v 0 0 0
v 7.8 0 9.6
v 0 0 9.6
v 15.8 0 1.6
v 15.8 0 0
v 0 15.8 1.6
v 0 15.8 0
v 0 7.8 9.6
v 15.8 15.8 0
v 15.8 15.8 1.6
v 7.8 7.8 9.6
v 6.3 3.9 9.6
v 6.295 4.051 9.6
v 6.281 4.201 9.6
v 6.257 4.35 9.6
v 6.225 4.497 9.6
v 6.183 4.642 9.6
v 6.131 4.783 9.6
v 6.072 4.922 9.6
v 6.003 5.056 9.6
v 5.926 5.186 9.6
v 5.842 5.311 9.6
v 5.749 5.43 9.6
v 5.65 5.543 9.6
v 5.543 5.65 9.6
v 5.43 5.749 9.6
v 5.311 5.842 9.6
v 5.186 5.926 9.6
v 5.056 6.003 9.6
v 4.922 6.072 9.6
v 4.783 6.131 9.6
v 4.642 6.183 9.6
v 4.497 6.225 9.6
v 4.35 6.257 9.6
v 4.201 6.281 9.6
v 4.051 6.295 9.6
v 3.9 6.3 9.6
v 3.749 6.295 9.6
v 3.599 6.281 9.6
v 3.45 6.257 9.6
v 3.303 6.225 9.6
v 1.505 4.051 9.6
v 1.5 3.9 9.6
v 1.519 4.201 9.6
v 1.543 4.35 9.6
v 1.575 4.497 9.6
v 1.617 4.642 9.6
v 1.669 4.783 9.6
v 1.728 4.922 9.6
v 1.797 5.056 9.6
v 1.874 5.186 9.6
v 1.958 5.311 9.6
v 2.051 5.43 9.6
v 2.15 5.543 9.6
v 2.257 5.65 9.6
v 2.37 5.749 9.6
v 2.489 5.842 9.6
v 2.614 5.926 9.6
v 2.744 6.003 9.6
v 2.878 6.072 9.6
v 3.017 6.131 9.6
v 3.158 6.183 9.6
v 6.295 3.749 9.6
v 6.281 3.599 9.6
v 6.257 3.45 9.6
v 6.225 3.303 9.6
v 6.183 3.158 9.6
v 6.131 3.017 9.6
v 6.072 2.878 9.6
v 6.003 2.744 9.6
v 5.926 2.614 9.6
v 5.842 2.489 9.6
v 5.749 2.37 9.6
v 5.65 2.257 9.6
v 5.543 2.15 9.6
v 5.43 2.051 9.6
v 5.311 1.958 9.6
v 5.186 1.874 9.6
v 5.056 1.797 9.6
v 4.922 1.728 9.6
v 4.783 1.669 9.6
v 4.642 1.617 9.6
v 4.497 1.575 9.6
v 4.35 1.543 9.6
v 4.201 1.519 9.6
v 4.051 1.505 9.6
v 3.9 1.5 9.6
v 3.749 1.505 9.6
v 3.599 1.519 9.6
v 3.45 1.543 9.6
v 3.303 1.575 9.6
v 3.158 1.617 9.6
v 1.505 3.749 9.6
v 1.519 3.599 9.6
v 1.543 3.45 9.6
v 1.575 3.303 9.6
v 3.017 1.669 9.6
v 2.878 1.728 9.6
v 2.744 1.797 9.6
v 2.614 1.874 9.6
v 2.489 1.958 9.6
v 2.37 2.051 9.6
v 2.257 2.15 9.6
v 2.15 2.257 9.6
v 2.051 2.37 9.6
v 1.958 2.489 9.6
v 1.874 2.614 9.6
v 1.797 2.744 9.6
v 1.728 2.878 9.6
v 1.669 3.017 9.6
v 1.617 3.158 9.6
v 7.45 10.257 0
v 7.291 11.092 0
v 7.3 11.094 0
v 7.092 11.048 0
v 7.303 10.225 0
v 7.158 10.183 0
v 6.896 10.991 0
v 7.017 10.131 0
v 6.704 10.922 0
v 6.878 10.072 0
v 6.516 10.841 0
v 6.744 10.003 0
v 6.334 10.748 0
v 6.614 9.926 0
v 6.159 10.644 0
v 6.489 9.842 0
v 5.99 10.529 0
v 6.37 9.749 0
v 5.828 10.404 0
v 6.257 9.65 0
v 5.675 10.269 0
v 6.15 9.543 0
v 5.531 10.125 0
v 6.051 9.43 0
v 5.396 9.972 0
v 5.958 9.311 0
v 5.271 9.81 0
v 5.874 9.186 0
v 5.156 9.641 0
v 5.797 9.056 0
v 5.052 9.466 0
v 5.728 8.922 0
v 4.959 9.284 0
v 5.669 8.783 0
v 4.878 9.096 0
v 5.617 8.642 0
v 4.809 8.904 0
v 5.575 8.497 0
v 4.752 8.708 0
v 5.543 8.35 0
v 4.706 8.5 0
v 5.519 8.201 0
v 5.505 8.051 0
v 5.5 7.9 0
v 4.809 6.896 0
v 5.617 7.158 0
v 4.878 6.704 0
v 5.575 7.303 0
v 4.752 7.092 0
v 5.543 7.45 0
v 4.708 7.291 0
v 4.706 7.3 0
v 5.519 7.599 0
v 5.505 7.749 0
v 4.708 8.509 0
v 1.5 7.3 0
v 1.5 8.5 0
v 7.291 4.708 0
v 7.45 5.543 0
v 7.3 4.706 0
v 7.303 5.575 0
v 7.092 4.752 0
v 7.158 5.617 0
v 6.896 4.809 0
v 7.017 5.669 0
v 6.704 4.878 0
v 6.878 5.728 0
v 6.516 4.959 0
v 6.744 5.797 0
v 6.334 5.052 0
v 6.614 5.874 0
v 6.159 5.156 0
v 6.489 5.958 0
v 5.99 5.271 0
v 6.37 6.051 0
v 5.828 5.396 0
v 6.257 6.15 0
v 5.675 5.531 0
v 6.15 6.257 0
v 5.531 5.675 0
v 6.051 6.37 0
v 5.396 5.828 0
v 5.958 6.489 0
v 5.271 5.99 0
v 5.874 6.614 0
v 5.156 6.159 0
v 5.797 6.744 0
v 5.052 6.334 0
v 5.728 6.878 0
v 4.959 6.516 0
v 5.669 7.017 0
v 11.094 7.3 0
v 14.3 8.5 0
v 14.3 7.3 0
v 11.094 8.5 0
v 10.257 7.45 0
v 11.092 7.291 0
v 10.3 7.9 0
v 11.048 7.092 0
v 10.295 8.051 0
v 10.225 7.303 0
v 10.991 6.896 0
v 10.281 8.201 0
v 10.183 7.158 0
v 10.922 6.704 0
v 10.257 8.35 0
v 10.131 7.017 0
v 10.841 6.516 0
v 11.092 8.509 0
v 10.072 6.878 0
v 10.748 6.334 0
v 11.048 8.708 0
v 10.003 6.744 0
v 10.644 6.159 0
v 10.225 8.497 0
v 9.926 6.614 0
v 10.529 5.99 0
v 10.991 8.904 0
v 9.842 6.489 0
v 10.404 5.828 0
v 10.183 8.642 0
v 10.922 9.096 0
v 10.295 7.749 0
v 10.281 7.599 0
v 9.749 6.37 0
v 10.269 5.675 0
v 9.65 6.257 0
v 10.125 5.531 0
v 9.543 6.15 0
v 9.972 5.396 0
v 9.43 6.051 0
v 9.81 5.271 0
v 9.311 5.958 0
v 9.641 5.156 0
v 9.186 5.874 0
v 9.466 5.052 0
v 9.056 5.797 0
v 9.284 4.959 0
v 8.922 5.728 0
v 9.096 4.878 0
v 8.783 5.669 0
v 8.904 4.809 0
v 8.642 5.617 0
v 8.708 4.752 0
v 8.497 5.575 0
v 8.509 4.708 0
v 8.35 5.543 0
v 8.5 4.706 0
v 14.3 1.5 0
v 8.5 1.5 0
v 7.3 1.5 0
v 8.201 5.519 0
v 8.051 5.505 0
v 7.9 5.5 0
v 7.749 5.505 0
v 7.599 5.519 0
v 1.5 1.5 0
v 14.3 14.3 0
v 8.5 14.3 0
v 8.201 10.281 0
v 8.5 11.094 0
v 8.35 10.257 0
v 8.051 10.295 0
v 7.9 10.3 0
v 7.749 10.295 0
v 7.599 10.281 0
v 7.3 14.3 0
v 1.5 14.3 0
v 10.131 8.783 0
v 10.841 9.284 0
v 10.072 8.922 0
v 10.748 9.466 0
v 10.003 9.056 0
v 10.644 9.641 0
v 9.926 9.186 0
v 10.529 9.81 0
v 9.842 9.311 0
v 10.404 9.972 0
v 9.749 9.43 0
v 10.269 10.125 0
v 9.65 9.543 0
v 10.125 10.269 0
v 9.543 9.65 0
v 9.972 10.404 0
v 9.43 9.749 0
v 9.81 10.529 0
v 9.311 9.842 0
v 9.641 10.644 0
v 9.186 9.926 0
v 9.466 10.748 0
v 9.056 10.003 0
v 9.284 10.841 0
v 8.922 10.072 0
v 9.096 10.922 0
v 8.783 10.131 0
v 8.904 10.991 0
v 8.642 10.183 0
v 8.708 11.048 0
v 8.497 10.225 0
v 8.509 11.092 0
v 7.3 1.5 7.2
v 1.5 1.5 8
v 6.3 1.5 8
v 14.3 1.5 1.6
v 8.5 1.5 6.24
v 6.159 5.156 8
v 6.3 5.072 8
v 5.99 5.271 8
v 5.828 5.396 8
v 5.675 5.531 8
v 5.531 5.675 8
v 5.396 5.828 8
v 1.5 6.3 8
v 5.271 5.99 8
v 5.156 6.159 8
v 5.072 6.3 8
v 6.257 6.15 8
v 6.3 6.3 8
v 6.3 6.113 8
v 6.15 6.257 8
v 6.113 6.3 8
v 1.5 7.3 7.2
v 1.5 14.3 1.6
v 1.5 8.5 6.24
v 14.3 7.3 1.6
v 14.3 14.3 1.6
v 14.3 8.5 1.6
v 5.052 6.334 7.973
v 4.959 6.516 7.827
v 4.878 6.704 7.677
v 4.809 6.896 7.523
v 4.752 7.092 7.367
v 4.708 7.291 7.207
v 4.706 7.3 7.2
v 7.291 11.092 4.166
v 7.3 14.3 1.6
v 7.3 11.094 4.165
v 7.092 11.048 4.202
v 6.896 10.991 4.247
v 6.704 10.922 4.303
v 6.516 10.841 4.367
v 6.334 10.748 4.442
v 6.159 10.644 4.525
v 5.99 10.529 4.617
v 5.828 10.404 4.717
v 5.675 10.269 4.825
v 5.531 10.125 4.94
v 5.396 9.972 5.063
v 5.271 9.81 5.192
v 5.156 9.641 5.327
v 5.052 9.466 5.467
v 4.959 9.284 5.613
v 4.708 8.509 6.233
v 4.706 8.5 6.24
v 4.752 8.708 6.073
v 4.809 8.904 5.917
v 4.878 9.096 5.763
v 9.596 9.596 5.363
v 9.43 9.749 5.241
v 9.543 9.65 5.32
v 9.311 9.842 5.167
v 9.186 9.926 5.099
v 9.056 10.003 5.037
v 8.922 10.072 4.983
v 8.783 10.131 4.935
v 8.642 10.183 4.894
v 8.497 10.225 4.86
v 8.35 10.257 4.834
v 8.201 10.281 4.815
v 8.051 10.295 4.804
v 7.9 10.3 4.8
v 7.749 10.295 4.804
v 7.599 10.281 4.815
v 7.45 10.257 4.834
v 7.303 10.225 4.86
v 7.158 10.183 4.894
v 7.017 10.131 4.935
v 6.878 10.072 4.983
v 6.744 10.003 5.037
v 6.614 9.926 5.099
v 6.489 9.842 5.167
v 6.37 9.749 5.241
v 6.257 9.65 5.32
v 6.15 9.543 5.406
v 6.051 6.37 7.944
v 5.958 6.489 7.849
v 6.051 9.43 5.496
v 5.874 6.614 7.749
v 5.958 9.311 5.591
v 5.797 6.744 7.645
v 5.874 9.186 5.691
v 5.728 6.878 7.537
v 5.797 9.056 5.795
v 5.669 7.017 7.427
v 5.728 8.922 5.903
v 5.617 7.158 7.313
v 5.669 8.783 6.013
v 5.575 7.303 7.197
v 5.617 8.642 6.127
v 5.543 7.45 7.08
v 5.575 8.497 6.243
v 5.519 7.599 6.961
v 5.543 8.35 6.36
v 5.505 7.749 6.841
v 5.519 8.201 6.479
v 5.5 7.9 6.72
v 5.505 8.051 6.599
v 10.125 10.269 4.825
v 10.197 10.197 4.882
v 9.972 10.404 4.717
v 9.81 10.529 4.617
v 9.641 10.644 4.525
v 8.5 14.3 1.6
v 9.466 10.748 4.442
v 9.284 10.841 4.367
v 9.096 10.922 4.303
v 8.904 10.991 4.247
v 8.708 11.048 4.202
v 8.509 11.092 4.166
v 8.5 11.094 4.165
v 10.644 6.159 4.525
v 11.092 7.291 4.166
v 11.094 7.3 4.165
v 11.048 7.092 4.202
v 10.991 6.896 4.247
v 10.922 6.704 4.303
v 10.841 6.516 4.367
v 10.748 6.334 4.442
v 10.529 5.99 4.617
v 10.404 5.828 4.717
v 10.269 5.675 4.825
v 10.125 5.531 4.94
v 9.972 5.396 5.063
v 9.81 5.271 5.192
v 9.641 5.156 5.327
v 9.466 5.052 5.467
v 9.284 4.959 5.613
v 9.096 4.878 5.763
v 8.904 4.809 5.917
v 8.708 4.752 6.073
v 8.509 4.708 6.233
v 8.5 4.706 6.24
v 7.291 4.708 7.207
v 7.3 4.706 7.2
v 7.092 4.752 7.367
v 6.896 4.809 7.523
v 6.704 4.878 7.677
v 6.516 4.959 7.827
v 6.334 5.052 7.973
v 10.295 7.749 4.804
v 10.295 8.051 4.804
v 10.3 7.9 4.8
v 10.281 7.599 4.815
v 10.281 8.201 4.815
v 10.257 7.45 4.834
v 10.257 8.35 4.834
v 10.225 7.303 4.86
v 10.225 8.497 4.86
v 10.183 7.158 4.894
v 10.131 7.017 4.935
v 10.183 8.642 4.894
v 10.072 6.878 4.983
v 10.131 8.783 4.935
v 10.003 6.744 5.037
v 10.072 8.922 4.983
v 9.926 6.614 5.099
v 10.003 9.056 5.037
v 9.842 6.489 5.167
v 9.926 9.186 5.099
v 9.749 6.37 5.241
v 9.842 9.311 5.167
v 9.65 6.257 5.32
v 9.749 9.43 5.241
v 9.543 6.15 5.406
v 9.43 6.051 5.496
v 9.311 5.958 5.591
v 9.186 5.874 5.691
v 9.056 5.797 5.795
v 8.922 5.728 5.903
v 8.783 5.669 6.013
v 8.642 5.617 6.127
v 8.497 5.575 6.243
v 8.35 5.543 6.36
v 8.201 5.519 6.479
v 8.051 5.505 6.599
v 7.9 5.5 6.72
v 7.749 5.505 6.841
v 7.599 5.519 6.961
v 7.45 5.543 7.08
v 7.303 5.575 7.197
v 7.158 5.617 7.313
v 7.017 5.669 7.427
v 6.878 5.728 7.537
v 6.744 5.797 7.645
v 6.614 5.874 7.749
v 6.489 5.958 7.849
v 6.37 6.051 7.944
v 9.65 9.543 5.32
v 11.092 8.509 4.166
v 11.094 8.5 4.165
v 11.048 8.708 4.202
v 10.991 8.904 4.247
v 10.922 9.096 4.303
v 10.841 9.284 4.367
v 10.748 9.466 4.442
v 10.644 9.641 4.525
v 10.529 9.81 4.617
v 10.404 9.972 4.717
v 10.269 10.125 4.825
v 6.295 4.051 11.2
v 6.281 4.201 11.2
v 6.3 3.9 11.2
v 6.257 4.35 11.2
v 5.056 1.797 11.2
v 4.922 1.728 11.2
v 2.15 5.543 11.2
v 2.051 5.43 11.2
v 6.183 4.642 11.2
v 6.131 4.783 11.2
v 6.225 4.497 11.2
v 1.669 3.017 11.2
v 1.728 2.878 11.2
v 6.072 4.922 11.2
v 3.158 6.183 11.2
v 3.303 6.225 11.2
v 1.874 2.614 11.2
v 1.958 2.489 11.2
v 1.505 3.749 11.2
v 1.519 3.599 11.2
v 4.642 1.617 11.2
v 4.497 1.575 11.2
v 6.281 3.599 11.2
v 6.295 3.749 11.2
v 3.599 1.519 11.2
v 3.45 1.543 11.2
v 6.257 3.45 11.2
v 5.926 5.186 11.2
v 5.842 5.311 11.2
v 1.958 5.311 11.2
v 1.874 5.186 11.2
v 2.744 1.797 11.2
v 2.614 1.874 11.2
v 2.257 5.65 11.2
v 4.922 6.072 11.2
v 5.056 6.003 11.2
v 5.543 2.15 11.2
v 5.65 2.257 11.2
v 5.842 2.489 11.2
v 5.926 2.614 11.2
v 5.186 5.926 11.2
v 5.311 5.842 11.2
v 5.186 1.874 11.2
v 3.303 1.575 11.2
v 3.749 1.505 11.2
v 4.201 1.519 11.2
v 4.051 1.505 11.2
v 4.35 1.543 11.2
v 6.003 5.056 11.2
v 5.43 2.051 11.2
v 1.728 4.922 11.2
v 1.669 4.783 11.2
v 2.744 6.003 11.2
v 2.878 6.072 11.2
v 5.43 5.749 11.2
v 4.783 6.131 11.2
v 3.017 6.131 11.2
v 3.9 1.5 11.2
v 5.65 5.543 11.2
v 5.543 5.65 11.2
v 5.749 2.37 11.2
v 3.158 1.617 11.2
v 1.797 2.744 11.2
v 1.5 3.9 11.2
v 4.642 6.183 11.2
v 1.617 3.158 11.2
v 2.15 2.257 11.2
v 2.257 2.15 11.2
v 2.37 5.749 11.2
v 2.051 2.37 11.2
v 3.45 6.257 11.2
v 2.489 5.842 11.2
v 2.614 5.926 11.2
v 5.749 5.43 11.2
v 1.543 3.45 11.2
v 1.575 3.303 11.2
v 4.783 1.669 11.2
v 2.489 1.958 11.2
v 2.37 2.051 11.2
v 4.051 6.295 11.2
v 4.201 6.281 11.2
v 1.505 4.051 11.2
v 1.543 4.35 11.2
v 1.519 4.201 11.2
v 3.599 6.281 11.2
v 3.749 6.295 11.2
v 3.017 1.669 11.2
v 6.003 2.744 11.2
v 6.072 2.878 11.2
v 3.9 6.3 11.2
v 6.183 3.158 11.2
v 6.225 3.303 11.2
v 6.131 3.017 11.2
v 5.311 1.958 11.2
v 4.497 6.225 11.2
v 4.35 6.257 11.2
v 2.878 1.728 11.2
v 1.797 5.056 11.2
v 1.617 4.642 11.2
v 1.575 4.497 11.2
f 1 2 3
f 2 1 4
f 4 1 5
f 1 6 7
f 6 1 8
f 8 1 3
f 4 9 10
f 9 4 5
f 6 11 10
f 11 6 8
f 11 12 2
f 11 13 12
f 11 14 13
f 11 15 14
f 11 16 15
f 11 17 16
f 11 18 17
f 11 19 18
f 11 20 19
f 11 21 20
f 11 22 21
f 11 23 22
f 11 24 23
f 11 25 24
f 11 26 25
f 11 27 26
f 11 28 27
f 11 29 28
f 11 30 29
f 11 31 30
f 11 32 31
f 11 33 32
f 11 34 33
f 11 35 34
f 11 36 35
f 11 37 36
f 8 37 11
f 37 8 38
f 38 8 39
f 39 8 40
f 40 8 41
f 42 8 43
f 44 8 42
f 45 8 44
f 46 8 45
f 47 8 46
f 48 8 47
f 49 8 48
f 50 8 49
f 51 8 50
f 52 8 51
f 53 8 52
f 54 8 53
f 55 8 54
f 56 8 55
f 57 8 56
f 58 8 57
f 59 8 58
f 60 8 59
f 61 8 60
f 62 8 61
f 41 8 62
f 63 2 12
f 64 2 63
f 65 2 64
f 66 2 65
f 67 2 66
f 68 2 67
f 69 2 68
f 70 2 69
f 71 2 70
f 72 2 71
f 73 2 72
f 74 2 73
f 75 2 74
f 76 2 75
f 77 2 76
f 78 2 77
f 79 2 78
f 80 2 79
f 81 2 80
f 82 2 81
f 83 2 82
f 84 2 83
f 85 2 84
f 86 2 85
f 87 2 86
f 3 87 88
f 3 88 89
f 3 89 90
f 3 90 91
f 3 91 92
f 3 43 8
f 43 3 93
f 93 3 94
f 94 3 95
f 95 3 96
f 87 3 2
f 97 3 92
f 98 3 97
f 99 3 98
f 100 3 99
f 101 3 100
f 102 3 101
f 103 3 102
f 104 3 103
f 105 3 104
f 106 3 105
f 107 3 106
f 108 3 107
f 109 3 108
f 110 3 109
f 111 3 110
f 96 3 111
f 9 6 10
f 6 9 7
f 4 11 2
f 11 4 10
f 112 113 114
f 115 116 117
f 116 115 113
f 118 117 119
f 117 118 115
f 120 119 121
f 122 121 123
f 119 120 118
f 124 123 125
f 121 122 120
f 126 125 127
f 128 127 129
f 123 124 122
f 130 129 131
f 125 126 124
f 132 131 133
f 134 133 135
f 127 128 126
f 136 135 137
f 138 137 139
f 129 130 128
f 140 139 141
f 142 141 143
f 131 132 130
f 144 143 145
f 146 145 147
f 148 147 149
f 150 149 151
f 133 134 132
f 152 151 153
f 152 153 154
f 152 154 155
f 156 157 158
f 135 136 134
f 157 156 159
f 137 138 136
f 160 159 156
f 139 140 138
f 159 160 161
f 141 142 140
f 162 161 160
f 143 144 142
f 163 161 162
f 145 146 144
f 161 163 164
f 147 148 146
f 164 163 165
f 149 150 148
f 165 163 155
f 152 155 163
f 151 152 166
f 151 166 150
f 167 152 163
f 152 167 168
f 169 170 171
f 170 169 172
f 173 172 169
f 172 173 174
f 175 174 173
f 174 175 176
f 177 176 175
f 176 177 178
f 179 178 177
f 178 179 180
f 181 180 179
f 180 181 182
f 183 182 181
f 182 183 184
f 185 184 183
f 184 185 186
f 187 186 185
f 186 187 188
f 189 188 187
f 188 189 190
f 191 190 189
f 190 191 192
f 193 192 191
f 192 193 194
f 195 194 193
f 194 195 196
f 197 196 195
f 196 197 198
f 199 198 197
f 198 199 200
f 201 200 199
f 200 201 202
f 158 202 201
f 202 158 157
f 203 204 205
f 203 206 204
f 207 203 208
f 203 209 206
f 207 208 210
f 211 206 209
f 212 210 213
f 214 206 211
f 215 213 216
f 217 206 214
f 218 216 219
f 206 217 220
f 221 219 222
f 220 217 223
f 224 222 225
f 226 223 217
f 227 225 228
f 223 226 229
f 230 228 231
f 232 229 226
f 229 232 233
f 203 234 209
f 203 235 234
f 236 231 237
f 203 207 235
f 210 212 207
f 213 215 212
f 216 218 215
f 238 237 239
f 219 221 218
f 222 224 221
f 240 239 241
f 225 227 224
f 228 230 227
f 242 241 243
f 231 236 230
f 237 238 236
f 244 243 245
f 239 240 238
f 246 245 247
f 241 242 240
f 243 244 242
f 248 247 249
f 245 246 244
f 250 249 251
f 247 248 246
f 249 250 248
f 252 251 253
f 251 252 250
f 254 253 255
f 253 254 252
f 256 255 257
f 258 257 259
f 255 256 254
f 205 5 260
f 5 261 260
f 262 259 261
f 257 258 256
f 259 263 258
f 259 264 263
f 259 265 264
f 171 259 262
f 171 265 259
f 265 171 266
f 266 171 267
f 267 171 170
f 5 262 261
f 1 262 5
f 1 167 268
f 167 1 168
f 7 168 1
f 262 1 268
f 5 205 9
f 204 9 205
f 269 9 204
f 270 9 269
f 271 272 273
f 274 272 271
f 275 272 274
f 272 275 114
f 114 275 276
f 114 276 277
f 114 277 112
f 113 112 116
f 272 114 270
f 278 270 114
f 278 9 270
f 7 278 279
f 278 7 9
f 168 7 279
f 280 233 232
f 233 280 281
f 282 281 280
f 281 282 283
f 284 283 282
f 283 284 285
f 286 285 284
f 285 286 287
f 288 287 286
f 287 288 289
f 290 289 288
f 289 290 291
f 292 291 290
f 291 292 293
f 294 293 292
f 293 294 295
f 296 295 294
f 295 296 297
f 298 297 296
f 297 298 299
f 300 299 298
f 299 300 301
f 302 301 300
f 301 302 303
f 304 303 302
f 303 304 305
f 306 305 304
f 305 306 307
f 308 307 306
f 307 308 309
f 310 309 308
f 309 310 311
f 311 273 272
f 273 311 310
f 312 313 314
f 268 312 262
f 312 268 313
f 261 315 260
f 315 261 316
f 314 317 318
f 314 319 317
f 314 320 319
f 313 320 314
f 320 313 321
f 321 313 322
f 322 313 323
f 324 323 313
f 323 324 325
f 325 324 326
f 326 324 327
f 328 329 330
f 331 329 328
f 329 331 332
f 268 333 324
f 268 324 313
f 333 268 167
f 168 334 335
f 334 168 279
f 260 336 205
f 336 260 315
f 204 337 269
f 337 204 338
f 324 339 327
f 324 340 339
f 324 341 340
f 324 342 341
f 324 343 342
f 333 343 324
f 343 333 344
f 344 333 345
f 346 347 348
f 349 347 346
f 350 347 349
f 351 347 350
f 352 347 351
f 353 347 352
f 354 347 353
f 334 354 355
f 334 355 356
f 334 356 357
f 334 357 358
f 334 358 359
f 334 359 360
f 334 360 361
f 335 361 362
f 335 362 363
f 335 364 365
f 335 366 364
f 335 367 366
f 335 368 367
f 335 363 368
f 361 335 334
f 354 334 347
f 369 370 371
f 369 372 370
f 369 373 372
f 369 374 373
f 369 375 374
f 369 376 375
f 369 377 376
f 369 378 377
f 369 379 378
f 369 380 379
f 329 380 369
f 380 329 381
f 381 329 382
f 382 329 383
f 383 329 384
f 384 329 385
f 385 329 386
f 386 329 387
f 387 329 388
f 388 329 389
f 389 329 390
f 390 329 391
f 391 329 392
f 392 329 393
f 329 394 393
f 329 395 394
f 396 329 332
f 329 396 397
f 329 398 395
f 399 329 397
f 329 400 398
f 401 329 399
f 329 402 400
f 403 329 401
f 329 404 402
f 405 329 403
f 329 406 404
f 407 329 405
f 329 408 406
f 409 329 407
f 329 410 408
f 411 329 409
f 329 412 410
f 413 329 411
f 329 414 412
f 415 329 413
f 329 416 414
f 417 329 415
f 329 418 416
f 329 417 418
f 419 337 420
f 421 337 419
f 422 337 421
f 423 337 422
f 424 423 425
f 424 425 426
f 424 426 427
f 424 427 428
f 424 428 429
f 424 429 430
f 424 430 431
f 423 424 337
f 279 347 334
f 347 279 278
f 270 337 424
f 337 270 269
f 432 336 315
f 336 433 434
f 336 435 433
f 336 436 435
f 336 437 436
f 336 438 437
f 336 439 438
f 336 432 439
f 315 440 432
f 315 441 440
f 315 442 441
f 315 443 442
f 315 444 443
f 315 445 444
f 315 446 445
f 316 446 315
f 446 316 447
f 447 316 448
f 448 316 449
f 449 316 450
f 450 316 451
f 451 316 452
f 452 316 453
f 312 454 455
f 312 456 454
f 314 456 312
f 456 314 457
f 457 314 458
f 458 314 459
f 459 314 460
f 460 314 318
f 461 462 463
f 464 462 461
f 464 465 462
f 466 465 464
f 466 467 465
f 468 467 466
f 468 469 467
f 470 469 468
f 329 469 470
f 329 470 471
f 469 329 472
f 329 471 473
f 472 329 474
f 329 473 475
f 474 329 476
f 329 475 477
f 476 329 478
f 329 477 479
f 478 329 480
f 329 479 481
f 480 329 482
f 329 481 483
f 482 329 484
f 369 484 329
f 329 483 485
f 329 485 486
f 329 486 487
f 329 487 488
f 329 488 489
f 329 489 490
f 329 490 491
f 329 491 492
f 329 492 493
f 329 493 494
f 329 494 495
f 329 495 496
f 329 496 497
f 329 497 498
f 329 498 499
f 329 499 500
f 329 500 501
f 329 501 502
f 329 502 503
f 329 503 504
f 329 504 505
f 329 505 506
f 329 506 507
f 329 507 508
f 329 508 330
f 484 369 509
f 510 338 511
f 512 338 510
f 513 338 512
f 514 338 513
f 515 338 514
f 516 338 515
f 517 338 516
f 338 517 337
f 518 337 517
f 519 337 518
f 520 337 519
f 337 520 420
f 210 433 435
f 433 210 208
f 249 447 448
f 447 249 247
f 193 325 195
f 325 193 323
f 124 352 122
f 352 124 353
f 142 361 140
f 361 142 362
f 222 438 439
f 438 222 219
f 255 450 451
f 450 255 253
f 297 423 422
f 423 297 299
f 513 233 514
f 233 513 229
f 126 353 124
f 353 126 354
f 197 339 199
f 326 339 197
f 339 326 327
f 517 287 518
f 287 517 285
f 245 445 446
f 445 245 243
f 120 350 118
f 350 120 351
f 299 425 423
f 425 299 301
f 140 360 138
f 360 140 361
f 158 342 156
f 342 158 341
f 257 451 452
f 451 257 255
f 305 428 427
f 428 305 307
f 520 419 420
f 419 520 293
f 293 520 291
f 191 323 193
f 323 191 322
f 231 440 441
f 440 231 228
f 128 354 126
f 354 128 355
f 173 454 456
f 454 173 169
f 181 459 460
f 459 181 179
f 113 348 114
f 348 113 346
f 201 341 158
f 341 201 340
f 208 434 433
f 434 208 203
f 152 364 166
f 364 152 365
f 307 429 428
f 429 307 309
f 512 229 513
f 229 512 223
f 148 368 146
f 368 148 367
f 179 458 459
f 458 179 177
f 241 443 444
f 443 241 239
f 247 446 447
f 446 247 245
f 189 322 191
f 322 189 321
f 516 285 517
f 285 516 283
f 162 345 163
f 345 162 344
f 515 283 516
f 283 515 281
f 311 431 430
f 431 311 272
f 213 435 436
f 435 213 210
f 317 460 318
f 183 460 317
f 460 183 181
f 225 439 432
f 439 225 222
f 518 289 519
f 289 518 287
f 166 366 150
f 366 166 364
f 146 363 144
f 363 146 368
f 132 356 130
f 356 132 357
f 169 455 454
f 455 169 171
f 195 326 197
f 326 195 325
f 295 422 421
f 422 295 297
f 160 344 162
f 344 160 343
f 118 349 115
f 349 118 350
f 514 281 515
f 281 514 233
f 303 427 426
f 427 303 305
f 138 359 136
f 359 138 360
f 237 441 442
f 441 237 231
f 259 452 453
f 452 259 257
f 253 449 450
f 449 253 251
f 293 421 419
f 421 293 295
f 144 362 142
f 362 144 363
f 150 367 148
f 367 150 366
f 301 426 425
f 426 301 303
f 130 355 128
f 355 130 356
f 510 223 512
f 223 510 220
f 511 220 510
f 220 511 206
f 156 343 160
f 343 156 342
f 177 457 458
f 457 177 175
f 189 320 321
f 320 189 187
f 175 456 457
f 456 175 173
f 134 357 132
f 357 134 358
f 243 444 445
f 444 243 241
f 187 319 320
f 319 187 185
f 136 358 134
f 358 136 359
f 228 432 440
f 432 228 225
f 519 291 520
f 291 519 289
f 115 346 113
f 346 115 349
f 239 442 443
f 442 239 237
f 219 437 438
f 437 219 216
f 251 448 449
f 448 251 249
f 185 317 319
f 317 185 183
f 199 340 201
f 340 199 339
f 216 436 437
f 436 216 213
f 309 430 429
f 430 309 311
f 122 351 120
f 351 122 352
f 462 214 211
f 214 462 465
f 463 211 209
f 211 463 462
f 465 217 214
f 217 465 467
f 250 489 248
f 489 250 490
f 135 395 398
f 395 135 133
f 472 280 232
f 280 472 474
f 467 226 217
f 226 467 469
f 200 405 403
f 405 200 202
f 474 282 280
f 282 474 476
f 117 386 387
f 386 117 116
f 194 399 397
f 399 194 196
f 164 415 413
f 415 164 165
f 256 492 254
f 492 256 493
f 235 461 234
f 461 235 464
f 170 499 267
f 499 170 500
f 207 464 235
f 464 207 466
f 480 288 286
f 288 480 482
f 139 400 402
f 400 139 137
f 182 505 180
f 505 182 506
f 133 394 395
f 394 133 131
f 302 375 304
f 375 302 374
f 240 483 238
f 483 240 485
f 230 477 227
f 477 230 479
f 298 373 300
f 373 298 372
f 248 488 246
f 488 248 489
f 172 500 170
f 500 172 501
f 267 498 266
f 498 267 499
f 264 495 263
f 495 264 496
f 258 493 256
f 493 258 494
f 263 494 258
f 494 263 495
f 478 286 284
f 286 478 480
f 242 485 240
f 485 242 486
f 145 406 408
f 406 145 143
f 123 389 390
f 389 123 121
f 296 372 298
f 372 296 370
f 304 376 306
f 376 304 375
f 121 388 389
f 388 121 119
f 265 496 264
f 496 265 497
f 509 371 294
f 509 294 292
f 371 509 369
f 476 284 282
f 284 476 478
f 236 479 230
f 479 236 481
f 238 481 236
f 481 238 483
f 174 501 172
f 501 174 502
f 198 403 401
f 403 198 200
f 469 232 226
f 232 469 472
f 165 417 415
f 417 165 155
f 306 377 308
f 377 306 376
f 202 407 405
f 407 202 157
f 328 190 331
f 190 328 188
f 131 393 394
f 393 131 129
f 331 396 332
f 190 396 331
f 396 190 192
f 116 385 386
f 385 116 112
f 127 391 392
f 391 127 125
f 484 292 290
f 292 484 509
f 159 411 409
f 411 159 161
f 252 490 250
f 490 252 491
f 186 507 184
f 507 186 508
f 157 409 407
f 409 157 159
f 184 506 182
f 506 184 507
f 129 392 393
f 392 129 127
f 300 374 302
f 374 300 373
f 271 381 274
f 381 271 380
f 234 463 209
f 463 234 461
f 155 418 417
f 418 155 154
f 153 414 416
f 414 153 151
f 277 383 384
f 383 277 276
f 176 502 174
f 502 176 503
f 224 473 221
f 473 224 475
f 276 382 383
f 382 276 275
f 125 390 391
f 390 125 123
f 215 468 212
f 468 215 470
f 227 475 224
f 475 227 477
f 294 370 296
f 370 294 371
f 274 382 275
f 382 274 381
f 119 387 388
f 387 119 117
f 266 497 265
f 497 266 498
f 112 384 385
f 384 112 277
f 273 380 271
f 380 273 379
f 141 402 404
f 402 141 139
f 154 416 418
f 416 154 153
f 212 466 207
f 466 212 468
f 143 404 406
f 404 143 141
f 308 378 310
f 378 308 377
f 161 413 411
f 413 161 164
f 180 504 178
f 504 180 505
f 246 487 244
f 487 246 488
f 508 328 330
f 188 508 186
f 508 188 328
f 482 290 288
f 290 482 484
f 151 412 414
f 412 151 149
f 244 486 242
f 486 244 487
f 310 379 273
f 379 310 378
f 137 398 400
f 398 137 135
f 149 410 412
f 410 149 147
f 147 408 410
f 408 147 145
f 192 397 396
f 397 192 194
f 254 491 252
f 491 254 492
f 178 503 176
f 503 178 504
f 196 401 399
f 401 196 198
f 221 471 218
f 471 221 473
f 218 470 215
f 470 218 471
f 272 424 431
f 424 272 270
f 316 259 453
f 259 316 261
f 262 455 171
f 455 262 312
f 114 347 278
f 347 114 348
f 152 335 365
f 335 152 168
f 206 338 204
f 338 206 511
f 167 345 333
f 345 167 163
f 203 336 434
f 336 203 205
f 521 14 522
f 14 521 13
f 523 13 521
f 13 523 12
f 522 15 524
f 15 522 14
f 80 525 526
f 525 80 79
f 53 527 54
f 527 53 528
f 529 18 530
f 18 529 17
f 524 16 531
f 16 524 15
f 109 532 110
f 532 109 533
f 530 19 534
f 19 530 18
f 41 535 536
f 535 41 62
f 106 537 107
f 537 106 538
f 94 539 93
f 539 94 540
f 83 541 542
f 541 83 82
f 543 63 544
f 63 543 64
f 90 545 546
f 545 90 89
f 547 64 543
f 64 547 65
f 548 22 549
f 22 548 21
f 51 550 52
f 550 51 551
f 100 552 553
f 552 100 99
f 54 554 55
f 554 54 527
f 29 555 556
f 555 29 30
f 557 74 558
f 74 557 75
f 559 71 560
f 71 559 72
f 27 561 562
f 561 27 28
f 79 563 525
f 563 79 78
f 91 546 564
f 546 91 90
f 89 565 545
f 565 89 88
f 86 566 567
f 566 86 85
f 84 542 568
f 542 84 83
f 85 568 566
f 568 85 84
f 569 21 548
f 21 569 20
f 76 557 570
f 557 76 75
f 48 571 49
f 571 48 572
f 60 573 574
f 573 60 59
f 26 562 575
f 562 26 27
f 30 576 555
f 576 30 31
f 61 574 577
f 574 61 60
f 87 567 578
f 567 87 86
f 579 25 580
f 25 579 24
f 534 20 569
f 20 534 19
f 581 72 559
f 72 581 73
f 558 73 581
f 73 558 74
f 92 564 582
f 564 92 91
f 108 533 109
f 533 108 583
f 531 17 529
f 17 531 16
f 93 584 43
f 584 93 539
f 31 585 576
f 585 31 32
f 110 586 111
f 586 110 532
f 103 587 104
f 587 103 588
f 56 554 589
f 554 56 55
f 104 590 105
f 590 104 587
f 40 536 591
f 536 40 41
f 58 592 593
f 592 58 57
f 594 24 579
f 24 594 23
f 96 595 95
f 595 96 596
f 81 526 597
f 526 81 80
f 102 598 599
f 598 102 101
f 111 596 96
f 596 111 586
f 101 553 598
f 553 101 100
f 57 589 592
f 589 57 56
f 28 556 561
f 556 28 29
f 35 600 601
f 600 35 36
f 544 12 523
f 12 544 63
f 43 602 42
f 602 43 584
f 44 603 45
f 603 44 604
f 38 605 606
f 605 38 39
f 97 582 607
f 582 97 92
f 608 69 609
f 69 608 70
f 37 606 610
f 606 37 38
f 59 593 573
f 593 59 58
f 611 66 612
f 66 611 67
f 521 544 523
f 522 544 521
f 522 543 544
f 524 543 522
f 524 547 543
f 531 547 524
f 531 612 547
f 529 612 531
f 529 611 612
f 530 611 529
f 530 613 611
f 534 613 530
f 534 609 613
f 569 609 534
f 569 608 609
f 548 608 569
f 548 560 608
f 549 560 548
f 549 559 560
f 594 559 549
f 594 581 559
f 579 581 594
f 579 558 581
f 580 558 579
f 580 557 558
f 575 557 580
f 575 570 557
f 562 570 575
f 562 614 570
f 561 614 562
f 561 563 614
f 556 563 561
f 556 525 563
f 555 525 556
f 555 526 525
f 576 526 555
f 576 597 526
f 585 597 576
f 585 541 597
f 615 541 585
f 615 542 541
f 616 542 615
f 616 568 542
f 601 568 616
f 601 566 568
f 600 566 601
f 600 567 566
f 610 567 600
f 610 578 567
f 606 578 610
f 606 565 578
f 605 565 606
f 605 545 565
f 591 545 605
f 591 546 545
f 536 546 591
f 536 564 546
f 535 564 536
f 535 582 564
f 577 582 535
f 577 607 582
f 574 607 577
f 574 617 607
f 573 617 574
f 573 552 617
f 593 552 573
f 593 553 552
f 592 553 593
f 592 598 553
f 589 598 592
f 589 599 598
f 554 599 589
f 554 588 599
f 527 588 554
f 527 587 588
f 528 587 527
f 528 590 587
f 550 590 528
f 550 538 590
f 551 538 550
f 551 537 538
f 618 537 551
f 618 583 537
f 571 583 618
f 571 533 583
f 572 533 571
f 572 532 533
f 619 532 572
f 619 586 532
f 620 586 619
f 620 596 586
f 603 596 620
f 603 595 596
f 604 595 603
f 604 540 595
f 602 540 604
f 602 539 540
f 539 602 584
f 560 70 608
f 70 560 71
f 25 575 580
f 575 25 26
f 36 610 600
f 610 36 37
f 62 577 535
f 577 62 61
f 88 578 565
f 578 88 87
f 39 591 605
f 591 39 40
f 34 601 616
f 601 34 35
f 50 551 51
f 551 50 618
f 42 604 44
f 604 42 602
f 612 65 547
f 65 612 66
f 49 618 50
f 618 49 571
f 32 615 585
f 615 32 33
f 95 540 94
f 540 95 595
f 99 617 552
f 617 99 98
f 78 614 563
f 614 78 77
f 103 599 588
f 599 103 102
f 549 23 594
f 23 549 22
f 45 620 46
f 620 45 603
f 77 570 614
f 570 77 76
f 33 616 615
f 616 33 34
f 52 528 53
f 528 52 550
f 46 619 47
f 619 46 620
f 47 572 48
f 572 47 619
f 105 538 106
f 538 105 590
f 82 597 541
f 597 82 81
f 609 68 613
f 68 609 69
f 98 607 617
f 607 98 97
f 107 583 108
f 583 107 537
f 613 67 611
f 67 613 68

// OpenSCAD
eps = 0.001;

modelScale = 1.0;


nr_length_units_bottom = 2;
nr_length_units_top = 1;
nr_width_units_bottom = 2;
nr_width_units_top = 1;
isSolidExternalPin = true;
addInnerWalls = true;


// printability corrections; values should be zero for real object dimensions 
PRINTABLE = 0;
correction_t1 = PRINTABLE ? 0.05 : 0.0;



unit_size = 7.8*modelScale;
pitch = 8.0*modelScale;

ho1 = 1.6*modelScale;
ho2 = 8.0*modelScale;
hi1 = 1.6*modelScale;
hi2 = 6.4*modelScale;


t1 = (1.5-correction_t1)*modelScale; // wall thickness
t2 = 1.2*modelScale; // inner wall thickness


// internal pin
r1 = 6.5/2*modelScale;
r2 = 4.8/2*modelScale;


// external pin
h_pin = 1.6*modelScale;
r_pin1 = 4.8/2*modelScale;
r_pin2 = 3.2/2*modelScale;



function getSize(prmNrOfUnits) = prmNrOfUnits*unit_size + (prmNrOfUnits - 1) * (pitch - unit_size);

length_bottom = getSize(nr_length_units_bottom);
length_top = getSize(nr_length_units_top);
width_bottom = getSize(nr_width_units_bottom);
width_top = getSize(nr_width_units_top);
echo("length_bottom", length_bottom);
echo("length_top", length_top);
echo("width_bottom", width_bottom);
echo("width_top", width_top);


function getExternalPinPos(prmPinNr) = prmPinNr*pitch-pitch+unit_size/2;

function getInternalPinPos(prmPinNr) = prmPinNr*pitch-(pitch-unit_size)/2;



module drawExternalPinSolid(prmPinNrX,prmPinNrY)
{
	translate([0,0,ho1+ho2-eps]) cylinder(h_pin+eps,r_pin1,r_pin1,$fn=100*modelScale);
}


module drawExternalPinHollow()
{
	translate([0,0,ho1+ho2-eps]) 
    {
        difference()
        {
            cylinder(h_pin+eps,r_pin1,r_pin1,$fn=100*modelScale);
            cylinder(h_pin+2*eps,r_pin2,r_pin2,$fn=100*modelScale);
        }
    }
}


module drawExternalPin(prmPinNrX,prmPinNrY)
{
	if (isSolidExternalPin)
    {
        translate([getExternalPinPos(prmPinNrX),getExternalPinPos(prmPinNrY),0]) drawExternalPinSolid();
    }
    else
    {
        translate([getExternalPinPos(prmPinNrX),getExternalPinPos(prmPinNrY),0]) drawExternalPinHollow();
    }
}


module drawInternalPin(prmPinNrX,prmPinNrY)
{
	difference()
	{
		translate([getInternalPinPos(prmPinNrX),getInternalPinPos(prmPinNrY),0]) cylinder(hi1+hi2+eps,r1,r1,$fn=100*modelScale);
		translate([getInternalPinPos(prmPinNrX),getInternalPinPos(prmPinNrY),-eps]) cylinder(hi1+hi2+2*eps,r2,r2,$fn=100*modelScale);
	}
}


module drawInnerWallsX()
{
    if (nr_length_units_bottom > 1)
    {
        for (x = [1:nr_length_units_bottom-1])
        {
            if (nr_length_units_bottom > 1)
            {
                difference()
                {
                    union()
                    {
                        translate([getInternalPinPos(x)-t2/2,t1-eps,0]) cube([t2,width_bottom-2*t1+2*eps,hi1+hi2+eps]);
                    }
                    union()
                    {
                        if (nr_width_units_bottom > 1)
                        {
                            for (y = [1:nr_width_units_bottom-1]) 
                            {
                                translate([getInternalPinPos(x),getInternalPinPos(y),-eps]) cylinder(hi1+hi2+2*eps,r2,r2,$fn=100*modelScale);
                            }
                        }
                    }
                }
            }
        }
    }
}


module drawInnerWallsY()
{
    if (nr_width_units_bottom > 1)
    {
        for (y = [1:nr_width_units_bottom-1])
        {
            if (nr_width_units_bottom > 1)
            {
                difference()
                {
                    union()
                    {
                        translate([t1-eps,getInternalPinPos(y)-t2/2,0]) cube([length_bottom-2*t1+2*eps,t2,hi1+hi2+eps]);
                    }
                    union()
                    {
                        if (nr_length_units_bottom > 1)
                        {
                            for (x = [1:nr_length_units_bottom-1]) 
                            {
                                translate([getInternalPinPos(x),getInternalPinPos(y),-eps]) cylinder(hi1+hi2+2*eps,r2,r2,$fn=100*modelScale);
                            }
                        }
                    }
                }
            }
        }
    }
}


module drawOuterSlope()
{
    hull()
    {
        translate([0,0,ho1+ho2-eps]) cube([length_top,width_top,eps]);
        cube([length_bottom,width_bottom,ho1]);			
    }    
}


module drawOuterSlopeMask()
{
    difference()
    {
        translate([-eps,-eps,-eps]) cube([length_bottom+2*eps,width_bottom+2*eps,ho1+ho2+2*eps]);
        drawOuterSlope();
    }
}


module drawSlopeBrick() 
{
	difference()
	{
		union()
		{	
            drawOuterSlope();
		}
		union()
		{	
            hull()
            {
                translate([t1,t1,hi1+hi2-eps]) cube([length_top-2*t1,width_top-2*t1,eps]);
                translate([t1,t1,-eps]) cube([length_bottom-2*t1,width_bottom-2*t1,hi1+eps]);			
            }            
		}
	}

	for (x = [1:nr_length_units_top])
	{
		for (y = [1:nr_width_units_top])
		{	
            drawExternalPin(x,y);
		}
	}


    difference()
    {
        union()
        {
            if ((nr_length_units_bottom > 1) && (nr_width_units_bottom > 1)) 
            {
                for (x = [1:nr_length_units_bottom-1])
                {
                    for (y = [1:nr_width_units_bottom-1]) 
                    {	
                        drawInternalPin(x,y);
                    }
                }
            }
                
            if (addInnerWalls)
            {
                drawInnerWallsX();
                drawInnerWallsY();
            }
        }
        union()
        {
            drawOuterSlopeMask();
        }
    }
}



// tests
//drawOuterSlope();


// parts
drawSlopeBrick();
